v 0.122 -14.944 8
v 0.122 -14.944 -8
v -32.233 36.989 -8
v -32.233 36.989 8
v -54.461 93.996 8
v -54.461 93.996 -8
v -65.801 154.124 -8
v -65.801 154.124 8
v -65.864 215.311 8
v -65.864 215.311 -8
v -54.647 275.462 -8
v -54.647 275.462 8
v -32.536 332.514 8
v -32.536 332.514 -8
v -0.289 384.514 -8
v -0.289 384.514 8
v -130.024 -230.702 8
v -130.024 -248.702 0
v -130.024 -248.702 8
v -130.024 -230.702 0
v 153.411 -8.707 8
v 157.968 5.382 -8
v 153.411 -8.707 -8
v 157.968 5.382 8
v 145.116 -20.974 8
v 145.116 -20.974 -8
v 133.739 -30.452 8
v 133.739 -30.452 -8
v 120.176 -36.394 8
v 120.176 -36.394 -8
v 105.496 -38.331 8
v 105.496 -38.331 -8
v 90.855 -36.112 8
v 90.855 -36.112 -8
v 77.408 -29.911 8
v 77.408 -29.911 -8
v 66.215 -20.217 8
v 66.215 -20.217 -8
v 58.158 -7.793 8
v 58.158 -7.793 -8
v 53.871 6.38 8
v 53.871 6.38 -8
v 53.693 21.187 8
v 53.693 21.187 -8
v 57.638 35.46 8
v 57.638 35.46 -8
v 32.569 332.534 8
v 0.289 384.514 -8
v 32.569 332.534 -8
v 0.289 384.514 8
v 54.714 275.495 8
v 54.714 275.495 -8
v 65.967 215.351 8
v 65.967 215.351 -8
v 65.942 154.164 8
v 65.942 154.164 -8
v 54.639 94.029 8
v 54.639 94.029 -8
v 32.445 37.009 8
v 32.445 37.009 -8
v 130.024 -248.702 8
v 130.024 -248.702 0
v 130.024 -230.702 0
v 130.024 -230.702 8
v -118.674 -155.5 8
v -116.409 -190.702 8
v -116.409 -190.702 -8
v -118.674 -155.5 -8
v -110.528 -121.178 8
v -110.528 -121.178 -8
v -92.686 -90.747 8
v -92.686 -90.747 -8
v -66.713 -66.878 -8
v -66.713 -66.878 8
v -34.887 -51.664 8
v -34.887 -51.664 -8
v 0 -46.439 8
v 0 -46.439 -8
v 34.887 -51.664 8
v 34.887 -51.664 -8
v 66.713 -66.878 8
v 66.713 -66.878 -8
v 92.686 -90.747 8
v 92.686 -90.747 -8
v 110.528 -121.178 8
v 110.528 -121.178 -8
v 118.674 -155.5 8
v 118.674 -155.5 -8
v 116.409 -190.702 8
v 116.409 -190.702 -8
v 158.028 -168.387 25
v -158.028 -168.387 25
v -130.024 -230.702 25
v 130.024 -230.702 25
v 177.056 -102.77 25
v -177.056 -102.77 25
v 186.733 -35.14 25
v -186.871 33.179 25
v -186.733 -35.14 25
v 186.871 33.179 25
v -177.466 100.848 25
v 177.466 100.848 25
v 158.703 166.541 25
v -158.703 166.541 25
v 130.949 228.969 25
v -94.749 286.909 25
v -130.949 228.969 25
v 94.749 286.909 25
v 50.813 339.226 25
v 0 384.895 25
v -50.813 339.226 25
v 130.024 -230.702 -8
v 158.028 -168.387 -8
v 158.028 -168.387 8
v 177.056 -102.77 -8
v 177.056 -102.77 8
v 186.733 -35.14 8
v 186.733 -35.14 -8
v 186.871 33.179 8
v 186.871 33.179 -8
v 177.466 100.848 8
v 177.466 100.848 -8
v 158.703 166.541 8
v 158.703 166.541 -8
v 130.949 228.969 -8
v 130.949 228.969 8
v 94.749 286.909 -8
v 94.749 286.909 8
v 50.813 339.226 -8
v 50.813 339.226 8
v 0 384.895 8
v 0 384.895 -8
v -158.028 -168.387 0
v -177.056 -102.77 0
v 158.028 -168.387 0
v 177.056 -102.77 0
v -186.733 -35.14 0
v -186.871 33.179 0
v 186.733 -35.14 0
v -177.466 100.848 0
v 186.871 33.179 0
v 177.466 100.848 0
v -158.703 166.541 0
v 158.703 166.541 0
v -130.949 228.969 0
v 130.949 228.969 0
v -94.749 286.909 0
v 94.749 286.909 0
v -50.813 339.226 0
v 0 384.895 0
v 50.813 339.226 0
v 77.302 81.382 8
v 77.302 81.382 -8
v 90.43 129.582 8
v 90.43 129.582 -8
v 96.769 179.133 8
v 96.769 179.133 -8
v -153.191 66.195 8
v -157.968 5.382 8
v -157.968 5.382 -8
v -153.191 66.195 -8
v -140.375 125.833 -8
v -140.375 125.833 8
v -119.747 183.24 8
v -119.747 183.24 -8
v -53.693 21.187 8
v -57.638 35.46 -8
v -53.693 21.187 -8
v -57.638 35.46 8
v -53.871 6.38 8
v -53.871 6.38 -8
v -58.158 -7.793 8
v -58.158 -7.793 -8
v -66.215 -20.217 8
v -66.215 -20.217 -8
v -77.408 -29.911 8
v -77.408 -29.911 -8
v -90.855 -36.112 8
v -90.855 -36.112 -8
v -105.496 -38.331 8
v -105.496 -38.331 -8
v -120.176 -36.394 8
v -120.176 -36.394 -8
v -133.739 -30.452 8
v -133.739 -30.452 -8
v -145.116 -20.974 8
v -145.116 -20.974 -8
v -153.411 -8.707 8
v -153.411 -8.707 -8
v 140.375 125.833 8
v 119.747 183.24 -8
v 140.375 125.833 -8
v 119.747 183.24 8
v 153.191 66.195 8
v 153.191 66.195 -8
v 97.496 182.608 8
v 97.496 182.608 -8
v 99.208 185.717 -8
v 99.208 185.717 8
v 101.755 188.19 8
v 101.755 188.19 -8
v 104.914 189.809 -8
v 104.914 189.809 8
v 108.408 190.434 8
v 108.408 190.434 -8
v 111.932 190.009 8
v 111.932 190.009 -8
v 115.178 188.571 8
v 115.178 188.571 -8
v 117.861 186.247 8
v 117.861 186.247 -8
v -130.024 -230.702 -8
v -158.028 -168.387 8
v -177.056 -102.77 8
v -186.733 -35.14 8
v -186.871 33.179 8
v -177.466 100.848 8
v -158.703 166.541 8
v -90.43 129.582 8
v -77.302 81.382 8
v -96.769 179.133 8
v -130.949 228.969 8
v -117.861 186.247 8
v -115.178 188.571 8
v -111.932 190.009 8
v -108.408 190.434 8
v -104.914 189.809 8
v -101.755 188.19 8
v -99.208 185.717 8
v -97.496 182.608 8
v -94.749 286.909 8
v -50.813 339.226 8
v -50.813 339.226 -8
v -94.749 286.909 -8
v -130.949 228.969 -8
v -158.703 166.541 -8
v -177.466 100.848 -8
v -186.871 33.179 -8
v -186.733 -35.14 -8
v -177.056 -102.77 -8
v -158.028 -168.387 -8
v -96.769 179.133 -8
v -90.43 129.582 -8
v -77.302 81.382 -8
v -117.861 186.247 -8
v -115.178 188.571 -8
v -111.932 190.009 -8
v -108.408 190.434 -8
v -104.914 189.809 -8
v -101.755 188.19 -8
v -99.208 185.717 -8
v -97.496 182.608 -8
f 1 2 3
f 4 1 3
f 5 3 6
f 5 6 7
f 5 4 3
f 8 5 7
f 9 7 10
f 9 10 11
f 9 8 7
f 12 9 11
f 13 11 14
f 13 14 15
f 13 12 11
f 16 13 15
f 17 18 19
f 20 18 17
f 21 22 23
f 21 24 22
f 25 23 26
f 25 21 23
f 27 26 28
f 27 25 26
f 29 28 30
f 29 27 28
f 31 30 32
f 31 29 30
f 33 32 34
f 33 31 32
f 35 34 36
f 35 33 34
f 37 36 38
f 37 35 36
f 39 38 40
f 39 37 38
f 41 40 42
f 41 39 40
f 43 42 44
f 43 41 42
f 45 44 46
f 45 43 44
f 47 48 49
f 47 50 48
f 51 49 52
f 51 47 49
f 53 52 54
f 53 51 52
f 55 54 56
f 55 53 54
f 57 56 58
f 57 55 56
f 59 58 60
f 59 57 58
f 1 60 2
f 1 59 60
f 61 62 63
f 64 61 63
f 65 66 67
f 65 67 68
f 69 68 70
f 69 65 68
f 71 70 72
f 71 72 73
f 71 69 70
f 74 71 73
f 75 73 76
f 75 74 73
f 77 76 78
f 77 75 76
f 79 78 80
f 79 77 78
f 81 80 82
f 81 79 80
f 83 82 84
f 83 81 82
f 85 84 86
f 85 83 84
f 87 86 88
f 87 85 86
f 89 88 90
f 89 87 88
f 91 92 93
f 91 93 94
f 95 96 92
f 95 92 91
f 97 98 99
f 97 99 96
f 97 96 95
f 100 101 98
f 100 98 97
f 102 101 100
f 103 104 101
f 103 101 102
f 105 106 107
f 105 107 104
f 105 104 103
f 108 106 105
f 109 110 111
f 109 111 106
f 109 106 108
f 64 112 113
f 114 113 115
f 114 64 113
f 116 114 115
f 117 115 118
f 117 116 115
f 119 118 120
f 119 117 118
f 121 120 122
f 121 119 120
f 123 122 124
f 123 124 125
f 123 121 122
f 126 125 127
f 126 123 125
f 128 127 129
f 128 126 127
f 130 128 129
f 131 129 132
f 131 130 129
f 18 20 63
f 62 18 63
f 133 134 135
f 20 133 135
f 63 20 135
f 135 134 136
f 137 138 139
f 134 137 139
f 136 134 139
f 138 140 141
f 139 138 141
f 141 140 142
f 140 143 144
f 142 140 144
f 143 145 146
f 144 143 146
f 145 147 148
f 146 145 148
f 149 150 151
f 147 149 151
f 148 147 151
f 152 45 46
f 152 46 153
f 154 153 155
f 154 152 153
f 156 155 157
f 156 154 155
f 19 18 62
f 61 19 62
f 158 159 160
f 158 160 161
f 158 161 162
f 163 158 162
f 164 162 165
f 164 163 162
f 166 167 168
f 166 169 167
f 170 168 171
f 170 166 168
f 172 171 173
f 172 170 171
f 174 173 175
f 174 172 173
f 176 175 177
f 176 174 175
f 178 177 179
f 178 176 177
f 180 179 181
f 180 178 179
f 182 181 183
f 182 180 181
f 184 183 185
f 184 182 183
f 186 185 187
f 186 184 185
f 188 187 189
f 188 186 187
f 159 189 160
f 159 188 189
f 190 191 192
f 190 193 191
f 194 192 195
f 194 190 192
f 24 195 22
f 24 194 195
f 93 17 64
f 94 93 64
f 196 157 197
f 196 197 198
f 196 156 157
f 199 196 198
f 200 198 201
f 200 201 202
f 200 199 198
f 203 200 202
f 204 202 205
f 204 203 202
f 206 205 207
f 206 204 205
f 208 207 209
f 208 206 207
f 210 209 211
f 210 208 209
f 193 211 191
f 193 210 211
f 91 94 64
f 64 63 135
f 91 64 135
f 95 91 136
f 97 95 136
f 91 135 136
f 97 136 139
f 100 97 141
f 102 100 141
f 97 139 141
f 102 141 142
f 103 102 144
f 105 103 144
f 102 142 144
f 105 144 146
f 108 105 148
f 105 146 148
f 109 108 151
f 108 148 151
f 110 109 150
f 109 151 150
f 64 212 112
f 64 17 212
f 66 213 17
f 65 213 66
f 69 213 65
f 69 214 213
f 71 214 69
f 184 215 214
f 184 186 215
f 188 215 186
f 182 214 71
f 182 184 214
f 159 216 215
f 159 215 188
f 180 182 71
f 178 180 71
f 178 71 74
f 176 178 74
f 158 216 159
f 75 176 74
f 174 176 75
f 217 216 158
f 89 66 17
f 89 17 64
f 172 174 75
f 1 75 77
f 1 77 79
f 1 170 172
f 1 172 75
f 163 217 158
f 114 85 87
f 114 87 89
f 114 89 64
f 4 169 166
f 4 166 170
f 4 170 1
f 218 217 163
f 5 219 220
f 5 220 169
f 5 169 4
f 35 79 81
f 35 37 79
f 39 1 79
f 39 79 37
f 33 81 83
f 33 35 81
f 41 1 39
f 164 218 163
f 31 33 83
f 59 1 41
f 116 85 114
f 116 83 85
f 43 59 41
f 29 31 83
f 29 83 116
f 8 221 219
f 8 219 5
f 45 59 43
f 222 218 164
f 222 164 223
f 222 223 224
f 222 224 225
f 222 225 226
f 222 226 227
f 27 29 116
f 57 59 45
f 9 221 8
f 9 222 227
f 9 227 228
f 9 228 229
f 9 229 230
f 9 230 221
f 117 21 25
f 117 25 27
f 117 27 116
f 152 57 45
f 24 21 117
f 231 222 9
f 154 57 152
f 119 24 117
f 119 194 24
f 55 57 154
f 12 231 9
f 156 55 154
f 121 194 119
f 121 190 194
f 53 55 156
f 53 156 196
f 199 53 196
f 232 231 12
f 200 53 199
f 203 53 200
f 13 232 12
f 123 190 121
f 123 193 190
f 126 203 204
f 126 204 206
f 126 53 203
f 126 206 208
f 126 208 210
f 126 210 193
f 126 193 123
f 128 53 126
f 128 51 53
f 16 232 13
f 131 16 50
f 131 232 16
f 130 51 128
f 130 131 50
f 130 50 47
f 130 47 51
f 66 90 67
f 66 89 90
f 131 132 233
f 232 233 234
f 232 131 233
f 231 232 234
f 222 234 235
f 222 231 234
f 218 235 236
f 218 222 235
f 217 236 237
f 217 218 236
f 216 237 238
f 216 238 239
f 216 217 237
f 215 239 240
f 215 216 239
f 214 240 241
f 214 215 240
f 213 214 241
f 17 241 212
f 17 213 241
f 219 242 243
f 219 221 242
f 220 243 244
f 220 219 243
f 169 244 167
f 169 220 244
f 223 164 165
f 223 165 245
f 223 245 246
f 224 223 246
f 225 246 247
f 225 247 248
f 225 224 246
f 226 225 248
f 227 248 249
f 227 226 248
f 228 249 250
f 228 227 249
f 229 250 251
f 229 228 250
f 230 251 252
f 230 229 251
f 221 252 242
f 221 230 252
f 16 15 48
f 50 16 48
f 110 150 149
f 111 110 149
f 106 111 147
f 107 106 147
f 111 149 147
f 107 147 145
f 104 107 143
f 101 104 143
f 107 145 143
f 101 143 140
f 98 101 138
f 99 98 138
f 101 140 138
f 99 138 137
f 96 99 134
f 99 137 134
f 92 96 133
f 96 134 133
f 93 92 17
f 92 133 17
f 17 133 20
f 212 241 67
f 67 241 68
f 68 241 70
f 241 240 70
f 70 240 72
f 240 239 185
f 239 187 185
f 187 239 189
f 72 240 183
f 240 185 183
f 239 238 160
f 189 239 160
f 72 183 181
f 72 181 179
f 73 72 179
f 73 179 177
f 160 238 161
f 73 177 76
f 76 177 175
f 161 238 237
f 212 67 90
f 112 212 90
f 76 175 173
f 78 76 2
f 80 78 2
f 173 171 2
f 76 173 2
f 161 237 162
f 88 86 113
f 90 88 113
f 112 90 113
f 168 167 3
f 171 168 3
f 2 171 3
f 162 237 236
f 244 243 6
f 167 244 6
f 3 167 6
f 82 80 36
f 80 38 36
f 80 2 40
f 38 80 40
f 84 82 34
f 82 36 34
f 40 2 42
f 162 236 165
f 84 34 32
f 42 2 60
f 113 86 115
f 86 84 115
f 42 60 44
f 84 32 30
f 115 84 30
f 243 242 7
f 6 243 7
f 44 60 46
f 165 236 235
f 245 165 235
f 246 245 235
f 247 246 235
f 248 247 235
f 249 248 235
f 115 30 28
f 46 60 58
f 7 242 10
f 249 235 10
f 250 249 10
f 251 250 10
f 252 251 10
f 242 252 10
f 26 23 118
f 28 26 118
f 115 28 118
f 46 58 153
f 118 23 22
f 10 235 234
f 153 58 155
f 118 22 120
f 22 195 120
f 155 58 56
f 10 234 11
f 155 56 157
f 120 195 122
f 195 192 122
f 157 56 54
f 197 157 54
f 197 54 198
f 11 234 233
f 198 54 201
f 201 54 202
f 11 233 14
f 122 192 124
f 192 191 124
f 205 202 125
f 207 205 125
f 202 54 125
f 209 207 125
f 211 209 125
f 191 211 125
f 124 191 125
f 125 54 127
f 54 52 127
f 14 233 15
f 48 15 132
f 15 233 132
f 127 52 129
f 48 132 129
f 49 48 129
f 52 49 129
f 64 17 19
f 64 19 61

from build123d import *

# Parameters (mm, degrees)
F1_DEPTH = 8
F2_DEPTH = 25
F0_W     = 260.0473753379
F0_H     = 18
F3_DEPTH = 8


with BuildPart() as f1:
    # F0 (on Top) → F1 (new body, symmetric)
    with BuildSketch(Plane.XY):
        with BuildLine():
            ThreePointArc((130.023687669, -230.7024664879), (177.4658542143, 100.8481931393), (0, 384.8947908195))
            ThreePointArc((0, 384.8947908195), (-177.4658542143, 100.8481931393), (-130.023687669, -230.7024664879))
            Line((-130.023687669, -230.7024664879), (130.023687669, -230.7024664879))
        make_face()
        with BuildLine():
            ThreePointArc((-116.4091368779, -190.7024664879), (0, -46.4394716511), (116.4091368779, -190.7024664879))
            Line((116.4091368779, -190.7024664879), (-116.4091368779, -190.7024664879))
        make_face(mode=Mode.SUBTRACT)
        with BuildLine():
            ThreePointArc((-157.9683795481, 5.3817593866), (-147.7770049437, 96.2276147666), (-119.7465449836, 183.2398373016))
            ThreePointArc((-119.7465449836, 183.2398373016), (-106.6376449739, 190.2516231903), (-96.768933689, 179.1333077427))
            ThreePointArc((-96.768933689, 179.1333077427), (-84.7015708466, 105.2542818333), (-57.6378772255, 35.4596674073))
            ThreePointArc((-57.6378772255, 35.4596674073), (-90.8551676662, -36.1123876178), (-157.9683795481, 5.3817593866))
        make_face(mode=Mode.SUBTRACT)
        with BuildLine():
            ThreePointArc((0.1221596343, -14.9443653121), (-67.2509481397, 184.7158011806), (-0.2885299828, 384.5140801762))
            Line((-0.2885299828, 384.5140801762), (0.2888961989, 384.5140801762))
            ThreePointArc((0.2888961989, 384.5140801762), (67.3732536733, 184.7568211845), (0.1221596342, -14.9443653121))
        make_face(mode=Mode.SUBTRACT)
        with BuildLine():
            ThreePointArc((57.6378772255, 35.4596674073), (84.7015708466, 105.2542818333), (96.768933689, 179.1333077427))
            ThreePointArc((96.768933689, 179.1333077427), (106.6376449739, 190.2516231903), (119.7465449836, 183.2398373016))
            ThreePointArc((119.7465449836, 183.2398373016), (147.7770049437, 96.2276147666), (157.9683795481, 5.3817593866))
            ThreePointArc((157.9683795481, 5.3817593866), (90.8551676662, -36.1123876178), (57.6378772255, 35.4596674073))
        make_face(mode=Mode.SUBTRACT)
    extrude(amount=F1_DEPTH, both=True)


with BuildPart() as f2:
    # F0 (on Top) → F2 (new body)
    with BuildSketch(Plane.XY):
        with BuildLine():
            ThreePointArc((130.023687669, -230.7024664879), (177.4658542143, 100.8481931393), (0, 384.8947908195))
            ThreePointArc((0, 384.8947908195), (-177.4658542143, 100.8481931393), (-130.023687669, -230.7024664879))
            Line((-130.023687669, -230.7024664879), (130.023687669, -230.7024664879))
        make_face()
        with BuildLine():
            ThreePointArc((-116.4091368779, -190.7024664879), (0, -46.4394716511), (116.4091368779, -190.7024664879))
            Line((116.4091368779, -190.7024664879), (-116.4091368779, -190.7024664879))
        make_face(mode=Mode.SUBTRACT)
        with BuildLine():
            ThreePointArc((-157.9683795481, 5.3817593866), (-147.7770049437, 96.2276147666), (-119.7465449836, 183.2398373016))
            ThreePointArc((-119.7465449836, 183.2398373016), (-106.6376449739, 190.2516231903), (-96.768933689, 179.1333077427))
            ThreePointArc((-96.768933689, 179.1333077427), (-84.7015708466, 105.2542818333), (-57.6378772255, 35.4596674073))
            ThreePointArc((-57.6378772255, 35.4596674073), (-90.8551676662, -36.1123876178), (-157.9683795481, 5.3817593866))
        make_face(mode=Mode.SUBTRACT)
        with BuildLine():
            ThreePointArc((0.1221596343, -14.9443653121), (-67.2509481397, 184.7158011806), (-0.2885299828, 384.5140801762))
            Line((-0.2885299828, 384.5140801762), (0.2888961989, 384.5140801762))
            ThreePointArc((0.2888961989, 384.5140801762), (67.3732536733, 184.7568211845), (0.1221596342, -14.9443653121))
        make_face(mode=Mode.SUBTRACT)
        with BuildLine():
            ThreePointArc((57.6378772255, 35.4596674073), (84.7015708466, 105.2542818333), (96.768933689, 179.1333077427))
            ThreePointArc((96.768933689, 179.1333077427), (106.6376449739, 190.2516231903), (119.7465449836, 183.2398373016))
            ThreePointArc((119.7465449836, 183.2398373016), (147.7770049437, 96.2276147666), (157.9683795481, 5.3817593866))
            ThreePointArc((157.9683795481, 5.3817593866), (90.8551676662, -36.1123876178), (57.6378772255, 35.4596674073))
        make_face(mode=Mode.SUBTRACT)
        with BuildLine():
            Line((-116.4091368779, -190.7024664879), (116.4091368779, -190.7024664879))
            ThreePointArc((116.4091368779, -190.7024664879), (0, -46.4394716511), (-116.4091368779, -190.7024664879))
        make_face()
        with BuildLine():
            ThreePointArc((-96.768933689, 179.1333077427), (-106.6376449739, 190.2516231903), (-119.7465449836, 183.2398373016))
            ThreePointArc((-119.7465449836, 183.2398373016), (-147.7770049437, 96.2276147666), (-157.9683795481, 5.3817593866))
            ThreePointArc((-157.9683795481, 5.3817593866), (-90.8551676662, -36.1123876178), (-57.6378772255, 35.4596674073))
            ThreePointArc((-57.6378772255, 35.4596674073), (-84.7015708466, 105.2542818333), (-96.768933689, 179.1333077427))
        make_face()
        with BuildLine():
            Line((0.2888961989, 384.5140801762), (-0.2885299828, 384.5140801762))
            ThreePointArc((-0.2885299828, 384.5140801762), (-67.2509481397, 184.7158011806), (0.1221596343, -14.9443653121))
            ThreePointArc((0.1221596342, -14.9443653121), (67.3732536733, 184.7568211845), (0.2888961989, 384.5140801762))
        make_face()
        with BuildLine():
            ThreePointArc((0, 5.4204641238), (-55.3732812405, 184.8947908195), (0, 364.3691175153))
            ThreePointArc((0, 364.3691175153), (55.3732812405, 184.8947908195), (0, 5.4204641238))
        make_face(mode=Mode.SUBTRACT)
        with BuildLine():
            ThreePointArc((0, 5.4204641238), (55.3732812405, 184.8947908195), (0, 364.3691175153))
            ThreePointArc((0, 364.3691175153), (-55.3732812405, 184.8947908195), (0, 5.4204641238))
        make_face()
        with BuildLine():
            ThreePointArc((119.7465449836, 183.2398373016), (106.6376449739, 190.2516231903), (96.768933689, 179.1333077427))
            ThreePointArc((96.768933689, 179.1333077427), (84.7015708466, 105.2542818333), (57.6378772255, 35.4596674073))
            ThreePointArc((57.6378772255, 35.4596674073), (90.8551676662, -36.1123876178), (157.9683795481, 5.3817593866))
            ThreePointArc((157.9683795481, 5.3817593866), (147.7770049437, 96.2276147666), (119.7465449836, 183.2398373016))
        make_face()
    extrude(amount=F2_DEPTH)

    # F0 (on Top) → F3 (join)
    with BuildSketch(Plane.XY):
        with Locations((0, -239.7024664879)):
            Rectangle(F0_W, F0_H)
    extrude(amount=F3_DEPTH)


solid = Compound([f1.part, f2.part])
